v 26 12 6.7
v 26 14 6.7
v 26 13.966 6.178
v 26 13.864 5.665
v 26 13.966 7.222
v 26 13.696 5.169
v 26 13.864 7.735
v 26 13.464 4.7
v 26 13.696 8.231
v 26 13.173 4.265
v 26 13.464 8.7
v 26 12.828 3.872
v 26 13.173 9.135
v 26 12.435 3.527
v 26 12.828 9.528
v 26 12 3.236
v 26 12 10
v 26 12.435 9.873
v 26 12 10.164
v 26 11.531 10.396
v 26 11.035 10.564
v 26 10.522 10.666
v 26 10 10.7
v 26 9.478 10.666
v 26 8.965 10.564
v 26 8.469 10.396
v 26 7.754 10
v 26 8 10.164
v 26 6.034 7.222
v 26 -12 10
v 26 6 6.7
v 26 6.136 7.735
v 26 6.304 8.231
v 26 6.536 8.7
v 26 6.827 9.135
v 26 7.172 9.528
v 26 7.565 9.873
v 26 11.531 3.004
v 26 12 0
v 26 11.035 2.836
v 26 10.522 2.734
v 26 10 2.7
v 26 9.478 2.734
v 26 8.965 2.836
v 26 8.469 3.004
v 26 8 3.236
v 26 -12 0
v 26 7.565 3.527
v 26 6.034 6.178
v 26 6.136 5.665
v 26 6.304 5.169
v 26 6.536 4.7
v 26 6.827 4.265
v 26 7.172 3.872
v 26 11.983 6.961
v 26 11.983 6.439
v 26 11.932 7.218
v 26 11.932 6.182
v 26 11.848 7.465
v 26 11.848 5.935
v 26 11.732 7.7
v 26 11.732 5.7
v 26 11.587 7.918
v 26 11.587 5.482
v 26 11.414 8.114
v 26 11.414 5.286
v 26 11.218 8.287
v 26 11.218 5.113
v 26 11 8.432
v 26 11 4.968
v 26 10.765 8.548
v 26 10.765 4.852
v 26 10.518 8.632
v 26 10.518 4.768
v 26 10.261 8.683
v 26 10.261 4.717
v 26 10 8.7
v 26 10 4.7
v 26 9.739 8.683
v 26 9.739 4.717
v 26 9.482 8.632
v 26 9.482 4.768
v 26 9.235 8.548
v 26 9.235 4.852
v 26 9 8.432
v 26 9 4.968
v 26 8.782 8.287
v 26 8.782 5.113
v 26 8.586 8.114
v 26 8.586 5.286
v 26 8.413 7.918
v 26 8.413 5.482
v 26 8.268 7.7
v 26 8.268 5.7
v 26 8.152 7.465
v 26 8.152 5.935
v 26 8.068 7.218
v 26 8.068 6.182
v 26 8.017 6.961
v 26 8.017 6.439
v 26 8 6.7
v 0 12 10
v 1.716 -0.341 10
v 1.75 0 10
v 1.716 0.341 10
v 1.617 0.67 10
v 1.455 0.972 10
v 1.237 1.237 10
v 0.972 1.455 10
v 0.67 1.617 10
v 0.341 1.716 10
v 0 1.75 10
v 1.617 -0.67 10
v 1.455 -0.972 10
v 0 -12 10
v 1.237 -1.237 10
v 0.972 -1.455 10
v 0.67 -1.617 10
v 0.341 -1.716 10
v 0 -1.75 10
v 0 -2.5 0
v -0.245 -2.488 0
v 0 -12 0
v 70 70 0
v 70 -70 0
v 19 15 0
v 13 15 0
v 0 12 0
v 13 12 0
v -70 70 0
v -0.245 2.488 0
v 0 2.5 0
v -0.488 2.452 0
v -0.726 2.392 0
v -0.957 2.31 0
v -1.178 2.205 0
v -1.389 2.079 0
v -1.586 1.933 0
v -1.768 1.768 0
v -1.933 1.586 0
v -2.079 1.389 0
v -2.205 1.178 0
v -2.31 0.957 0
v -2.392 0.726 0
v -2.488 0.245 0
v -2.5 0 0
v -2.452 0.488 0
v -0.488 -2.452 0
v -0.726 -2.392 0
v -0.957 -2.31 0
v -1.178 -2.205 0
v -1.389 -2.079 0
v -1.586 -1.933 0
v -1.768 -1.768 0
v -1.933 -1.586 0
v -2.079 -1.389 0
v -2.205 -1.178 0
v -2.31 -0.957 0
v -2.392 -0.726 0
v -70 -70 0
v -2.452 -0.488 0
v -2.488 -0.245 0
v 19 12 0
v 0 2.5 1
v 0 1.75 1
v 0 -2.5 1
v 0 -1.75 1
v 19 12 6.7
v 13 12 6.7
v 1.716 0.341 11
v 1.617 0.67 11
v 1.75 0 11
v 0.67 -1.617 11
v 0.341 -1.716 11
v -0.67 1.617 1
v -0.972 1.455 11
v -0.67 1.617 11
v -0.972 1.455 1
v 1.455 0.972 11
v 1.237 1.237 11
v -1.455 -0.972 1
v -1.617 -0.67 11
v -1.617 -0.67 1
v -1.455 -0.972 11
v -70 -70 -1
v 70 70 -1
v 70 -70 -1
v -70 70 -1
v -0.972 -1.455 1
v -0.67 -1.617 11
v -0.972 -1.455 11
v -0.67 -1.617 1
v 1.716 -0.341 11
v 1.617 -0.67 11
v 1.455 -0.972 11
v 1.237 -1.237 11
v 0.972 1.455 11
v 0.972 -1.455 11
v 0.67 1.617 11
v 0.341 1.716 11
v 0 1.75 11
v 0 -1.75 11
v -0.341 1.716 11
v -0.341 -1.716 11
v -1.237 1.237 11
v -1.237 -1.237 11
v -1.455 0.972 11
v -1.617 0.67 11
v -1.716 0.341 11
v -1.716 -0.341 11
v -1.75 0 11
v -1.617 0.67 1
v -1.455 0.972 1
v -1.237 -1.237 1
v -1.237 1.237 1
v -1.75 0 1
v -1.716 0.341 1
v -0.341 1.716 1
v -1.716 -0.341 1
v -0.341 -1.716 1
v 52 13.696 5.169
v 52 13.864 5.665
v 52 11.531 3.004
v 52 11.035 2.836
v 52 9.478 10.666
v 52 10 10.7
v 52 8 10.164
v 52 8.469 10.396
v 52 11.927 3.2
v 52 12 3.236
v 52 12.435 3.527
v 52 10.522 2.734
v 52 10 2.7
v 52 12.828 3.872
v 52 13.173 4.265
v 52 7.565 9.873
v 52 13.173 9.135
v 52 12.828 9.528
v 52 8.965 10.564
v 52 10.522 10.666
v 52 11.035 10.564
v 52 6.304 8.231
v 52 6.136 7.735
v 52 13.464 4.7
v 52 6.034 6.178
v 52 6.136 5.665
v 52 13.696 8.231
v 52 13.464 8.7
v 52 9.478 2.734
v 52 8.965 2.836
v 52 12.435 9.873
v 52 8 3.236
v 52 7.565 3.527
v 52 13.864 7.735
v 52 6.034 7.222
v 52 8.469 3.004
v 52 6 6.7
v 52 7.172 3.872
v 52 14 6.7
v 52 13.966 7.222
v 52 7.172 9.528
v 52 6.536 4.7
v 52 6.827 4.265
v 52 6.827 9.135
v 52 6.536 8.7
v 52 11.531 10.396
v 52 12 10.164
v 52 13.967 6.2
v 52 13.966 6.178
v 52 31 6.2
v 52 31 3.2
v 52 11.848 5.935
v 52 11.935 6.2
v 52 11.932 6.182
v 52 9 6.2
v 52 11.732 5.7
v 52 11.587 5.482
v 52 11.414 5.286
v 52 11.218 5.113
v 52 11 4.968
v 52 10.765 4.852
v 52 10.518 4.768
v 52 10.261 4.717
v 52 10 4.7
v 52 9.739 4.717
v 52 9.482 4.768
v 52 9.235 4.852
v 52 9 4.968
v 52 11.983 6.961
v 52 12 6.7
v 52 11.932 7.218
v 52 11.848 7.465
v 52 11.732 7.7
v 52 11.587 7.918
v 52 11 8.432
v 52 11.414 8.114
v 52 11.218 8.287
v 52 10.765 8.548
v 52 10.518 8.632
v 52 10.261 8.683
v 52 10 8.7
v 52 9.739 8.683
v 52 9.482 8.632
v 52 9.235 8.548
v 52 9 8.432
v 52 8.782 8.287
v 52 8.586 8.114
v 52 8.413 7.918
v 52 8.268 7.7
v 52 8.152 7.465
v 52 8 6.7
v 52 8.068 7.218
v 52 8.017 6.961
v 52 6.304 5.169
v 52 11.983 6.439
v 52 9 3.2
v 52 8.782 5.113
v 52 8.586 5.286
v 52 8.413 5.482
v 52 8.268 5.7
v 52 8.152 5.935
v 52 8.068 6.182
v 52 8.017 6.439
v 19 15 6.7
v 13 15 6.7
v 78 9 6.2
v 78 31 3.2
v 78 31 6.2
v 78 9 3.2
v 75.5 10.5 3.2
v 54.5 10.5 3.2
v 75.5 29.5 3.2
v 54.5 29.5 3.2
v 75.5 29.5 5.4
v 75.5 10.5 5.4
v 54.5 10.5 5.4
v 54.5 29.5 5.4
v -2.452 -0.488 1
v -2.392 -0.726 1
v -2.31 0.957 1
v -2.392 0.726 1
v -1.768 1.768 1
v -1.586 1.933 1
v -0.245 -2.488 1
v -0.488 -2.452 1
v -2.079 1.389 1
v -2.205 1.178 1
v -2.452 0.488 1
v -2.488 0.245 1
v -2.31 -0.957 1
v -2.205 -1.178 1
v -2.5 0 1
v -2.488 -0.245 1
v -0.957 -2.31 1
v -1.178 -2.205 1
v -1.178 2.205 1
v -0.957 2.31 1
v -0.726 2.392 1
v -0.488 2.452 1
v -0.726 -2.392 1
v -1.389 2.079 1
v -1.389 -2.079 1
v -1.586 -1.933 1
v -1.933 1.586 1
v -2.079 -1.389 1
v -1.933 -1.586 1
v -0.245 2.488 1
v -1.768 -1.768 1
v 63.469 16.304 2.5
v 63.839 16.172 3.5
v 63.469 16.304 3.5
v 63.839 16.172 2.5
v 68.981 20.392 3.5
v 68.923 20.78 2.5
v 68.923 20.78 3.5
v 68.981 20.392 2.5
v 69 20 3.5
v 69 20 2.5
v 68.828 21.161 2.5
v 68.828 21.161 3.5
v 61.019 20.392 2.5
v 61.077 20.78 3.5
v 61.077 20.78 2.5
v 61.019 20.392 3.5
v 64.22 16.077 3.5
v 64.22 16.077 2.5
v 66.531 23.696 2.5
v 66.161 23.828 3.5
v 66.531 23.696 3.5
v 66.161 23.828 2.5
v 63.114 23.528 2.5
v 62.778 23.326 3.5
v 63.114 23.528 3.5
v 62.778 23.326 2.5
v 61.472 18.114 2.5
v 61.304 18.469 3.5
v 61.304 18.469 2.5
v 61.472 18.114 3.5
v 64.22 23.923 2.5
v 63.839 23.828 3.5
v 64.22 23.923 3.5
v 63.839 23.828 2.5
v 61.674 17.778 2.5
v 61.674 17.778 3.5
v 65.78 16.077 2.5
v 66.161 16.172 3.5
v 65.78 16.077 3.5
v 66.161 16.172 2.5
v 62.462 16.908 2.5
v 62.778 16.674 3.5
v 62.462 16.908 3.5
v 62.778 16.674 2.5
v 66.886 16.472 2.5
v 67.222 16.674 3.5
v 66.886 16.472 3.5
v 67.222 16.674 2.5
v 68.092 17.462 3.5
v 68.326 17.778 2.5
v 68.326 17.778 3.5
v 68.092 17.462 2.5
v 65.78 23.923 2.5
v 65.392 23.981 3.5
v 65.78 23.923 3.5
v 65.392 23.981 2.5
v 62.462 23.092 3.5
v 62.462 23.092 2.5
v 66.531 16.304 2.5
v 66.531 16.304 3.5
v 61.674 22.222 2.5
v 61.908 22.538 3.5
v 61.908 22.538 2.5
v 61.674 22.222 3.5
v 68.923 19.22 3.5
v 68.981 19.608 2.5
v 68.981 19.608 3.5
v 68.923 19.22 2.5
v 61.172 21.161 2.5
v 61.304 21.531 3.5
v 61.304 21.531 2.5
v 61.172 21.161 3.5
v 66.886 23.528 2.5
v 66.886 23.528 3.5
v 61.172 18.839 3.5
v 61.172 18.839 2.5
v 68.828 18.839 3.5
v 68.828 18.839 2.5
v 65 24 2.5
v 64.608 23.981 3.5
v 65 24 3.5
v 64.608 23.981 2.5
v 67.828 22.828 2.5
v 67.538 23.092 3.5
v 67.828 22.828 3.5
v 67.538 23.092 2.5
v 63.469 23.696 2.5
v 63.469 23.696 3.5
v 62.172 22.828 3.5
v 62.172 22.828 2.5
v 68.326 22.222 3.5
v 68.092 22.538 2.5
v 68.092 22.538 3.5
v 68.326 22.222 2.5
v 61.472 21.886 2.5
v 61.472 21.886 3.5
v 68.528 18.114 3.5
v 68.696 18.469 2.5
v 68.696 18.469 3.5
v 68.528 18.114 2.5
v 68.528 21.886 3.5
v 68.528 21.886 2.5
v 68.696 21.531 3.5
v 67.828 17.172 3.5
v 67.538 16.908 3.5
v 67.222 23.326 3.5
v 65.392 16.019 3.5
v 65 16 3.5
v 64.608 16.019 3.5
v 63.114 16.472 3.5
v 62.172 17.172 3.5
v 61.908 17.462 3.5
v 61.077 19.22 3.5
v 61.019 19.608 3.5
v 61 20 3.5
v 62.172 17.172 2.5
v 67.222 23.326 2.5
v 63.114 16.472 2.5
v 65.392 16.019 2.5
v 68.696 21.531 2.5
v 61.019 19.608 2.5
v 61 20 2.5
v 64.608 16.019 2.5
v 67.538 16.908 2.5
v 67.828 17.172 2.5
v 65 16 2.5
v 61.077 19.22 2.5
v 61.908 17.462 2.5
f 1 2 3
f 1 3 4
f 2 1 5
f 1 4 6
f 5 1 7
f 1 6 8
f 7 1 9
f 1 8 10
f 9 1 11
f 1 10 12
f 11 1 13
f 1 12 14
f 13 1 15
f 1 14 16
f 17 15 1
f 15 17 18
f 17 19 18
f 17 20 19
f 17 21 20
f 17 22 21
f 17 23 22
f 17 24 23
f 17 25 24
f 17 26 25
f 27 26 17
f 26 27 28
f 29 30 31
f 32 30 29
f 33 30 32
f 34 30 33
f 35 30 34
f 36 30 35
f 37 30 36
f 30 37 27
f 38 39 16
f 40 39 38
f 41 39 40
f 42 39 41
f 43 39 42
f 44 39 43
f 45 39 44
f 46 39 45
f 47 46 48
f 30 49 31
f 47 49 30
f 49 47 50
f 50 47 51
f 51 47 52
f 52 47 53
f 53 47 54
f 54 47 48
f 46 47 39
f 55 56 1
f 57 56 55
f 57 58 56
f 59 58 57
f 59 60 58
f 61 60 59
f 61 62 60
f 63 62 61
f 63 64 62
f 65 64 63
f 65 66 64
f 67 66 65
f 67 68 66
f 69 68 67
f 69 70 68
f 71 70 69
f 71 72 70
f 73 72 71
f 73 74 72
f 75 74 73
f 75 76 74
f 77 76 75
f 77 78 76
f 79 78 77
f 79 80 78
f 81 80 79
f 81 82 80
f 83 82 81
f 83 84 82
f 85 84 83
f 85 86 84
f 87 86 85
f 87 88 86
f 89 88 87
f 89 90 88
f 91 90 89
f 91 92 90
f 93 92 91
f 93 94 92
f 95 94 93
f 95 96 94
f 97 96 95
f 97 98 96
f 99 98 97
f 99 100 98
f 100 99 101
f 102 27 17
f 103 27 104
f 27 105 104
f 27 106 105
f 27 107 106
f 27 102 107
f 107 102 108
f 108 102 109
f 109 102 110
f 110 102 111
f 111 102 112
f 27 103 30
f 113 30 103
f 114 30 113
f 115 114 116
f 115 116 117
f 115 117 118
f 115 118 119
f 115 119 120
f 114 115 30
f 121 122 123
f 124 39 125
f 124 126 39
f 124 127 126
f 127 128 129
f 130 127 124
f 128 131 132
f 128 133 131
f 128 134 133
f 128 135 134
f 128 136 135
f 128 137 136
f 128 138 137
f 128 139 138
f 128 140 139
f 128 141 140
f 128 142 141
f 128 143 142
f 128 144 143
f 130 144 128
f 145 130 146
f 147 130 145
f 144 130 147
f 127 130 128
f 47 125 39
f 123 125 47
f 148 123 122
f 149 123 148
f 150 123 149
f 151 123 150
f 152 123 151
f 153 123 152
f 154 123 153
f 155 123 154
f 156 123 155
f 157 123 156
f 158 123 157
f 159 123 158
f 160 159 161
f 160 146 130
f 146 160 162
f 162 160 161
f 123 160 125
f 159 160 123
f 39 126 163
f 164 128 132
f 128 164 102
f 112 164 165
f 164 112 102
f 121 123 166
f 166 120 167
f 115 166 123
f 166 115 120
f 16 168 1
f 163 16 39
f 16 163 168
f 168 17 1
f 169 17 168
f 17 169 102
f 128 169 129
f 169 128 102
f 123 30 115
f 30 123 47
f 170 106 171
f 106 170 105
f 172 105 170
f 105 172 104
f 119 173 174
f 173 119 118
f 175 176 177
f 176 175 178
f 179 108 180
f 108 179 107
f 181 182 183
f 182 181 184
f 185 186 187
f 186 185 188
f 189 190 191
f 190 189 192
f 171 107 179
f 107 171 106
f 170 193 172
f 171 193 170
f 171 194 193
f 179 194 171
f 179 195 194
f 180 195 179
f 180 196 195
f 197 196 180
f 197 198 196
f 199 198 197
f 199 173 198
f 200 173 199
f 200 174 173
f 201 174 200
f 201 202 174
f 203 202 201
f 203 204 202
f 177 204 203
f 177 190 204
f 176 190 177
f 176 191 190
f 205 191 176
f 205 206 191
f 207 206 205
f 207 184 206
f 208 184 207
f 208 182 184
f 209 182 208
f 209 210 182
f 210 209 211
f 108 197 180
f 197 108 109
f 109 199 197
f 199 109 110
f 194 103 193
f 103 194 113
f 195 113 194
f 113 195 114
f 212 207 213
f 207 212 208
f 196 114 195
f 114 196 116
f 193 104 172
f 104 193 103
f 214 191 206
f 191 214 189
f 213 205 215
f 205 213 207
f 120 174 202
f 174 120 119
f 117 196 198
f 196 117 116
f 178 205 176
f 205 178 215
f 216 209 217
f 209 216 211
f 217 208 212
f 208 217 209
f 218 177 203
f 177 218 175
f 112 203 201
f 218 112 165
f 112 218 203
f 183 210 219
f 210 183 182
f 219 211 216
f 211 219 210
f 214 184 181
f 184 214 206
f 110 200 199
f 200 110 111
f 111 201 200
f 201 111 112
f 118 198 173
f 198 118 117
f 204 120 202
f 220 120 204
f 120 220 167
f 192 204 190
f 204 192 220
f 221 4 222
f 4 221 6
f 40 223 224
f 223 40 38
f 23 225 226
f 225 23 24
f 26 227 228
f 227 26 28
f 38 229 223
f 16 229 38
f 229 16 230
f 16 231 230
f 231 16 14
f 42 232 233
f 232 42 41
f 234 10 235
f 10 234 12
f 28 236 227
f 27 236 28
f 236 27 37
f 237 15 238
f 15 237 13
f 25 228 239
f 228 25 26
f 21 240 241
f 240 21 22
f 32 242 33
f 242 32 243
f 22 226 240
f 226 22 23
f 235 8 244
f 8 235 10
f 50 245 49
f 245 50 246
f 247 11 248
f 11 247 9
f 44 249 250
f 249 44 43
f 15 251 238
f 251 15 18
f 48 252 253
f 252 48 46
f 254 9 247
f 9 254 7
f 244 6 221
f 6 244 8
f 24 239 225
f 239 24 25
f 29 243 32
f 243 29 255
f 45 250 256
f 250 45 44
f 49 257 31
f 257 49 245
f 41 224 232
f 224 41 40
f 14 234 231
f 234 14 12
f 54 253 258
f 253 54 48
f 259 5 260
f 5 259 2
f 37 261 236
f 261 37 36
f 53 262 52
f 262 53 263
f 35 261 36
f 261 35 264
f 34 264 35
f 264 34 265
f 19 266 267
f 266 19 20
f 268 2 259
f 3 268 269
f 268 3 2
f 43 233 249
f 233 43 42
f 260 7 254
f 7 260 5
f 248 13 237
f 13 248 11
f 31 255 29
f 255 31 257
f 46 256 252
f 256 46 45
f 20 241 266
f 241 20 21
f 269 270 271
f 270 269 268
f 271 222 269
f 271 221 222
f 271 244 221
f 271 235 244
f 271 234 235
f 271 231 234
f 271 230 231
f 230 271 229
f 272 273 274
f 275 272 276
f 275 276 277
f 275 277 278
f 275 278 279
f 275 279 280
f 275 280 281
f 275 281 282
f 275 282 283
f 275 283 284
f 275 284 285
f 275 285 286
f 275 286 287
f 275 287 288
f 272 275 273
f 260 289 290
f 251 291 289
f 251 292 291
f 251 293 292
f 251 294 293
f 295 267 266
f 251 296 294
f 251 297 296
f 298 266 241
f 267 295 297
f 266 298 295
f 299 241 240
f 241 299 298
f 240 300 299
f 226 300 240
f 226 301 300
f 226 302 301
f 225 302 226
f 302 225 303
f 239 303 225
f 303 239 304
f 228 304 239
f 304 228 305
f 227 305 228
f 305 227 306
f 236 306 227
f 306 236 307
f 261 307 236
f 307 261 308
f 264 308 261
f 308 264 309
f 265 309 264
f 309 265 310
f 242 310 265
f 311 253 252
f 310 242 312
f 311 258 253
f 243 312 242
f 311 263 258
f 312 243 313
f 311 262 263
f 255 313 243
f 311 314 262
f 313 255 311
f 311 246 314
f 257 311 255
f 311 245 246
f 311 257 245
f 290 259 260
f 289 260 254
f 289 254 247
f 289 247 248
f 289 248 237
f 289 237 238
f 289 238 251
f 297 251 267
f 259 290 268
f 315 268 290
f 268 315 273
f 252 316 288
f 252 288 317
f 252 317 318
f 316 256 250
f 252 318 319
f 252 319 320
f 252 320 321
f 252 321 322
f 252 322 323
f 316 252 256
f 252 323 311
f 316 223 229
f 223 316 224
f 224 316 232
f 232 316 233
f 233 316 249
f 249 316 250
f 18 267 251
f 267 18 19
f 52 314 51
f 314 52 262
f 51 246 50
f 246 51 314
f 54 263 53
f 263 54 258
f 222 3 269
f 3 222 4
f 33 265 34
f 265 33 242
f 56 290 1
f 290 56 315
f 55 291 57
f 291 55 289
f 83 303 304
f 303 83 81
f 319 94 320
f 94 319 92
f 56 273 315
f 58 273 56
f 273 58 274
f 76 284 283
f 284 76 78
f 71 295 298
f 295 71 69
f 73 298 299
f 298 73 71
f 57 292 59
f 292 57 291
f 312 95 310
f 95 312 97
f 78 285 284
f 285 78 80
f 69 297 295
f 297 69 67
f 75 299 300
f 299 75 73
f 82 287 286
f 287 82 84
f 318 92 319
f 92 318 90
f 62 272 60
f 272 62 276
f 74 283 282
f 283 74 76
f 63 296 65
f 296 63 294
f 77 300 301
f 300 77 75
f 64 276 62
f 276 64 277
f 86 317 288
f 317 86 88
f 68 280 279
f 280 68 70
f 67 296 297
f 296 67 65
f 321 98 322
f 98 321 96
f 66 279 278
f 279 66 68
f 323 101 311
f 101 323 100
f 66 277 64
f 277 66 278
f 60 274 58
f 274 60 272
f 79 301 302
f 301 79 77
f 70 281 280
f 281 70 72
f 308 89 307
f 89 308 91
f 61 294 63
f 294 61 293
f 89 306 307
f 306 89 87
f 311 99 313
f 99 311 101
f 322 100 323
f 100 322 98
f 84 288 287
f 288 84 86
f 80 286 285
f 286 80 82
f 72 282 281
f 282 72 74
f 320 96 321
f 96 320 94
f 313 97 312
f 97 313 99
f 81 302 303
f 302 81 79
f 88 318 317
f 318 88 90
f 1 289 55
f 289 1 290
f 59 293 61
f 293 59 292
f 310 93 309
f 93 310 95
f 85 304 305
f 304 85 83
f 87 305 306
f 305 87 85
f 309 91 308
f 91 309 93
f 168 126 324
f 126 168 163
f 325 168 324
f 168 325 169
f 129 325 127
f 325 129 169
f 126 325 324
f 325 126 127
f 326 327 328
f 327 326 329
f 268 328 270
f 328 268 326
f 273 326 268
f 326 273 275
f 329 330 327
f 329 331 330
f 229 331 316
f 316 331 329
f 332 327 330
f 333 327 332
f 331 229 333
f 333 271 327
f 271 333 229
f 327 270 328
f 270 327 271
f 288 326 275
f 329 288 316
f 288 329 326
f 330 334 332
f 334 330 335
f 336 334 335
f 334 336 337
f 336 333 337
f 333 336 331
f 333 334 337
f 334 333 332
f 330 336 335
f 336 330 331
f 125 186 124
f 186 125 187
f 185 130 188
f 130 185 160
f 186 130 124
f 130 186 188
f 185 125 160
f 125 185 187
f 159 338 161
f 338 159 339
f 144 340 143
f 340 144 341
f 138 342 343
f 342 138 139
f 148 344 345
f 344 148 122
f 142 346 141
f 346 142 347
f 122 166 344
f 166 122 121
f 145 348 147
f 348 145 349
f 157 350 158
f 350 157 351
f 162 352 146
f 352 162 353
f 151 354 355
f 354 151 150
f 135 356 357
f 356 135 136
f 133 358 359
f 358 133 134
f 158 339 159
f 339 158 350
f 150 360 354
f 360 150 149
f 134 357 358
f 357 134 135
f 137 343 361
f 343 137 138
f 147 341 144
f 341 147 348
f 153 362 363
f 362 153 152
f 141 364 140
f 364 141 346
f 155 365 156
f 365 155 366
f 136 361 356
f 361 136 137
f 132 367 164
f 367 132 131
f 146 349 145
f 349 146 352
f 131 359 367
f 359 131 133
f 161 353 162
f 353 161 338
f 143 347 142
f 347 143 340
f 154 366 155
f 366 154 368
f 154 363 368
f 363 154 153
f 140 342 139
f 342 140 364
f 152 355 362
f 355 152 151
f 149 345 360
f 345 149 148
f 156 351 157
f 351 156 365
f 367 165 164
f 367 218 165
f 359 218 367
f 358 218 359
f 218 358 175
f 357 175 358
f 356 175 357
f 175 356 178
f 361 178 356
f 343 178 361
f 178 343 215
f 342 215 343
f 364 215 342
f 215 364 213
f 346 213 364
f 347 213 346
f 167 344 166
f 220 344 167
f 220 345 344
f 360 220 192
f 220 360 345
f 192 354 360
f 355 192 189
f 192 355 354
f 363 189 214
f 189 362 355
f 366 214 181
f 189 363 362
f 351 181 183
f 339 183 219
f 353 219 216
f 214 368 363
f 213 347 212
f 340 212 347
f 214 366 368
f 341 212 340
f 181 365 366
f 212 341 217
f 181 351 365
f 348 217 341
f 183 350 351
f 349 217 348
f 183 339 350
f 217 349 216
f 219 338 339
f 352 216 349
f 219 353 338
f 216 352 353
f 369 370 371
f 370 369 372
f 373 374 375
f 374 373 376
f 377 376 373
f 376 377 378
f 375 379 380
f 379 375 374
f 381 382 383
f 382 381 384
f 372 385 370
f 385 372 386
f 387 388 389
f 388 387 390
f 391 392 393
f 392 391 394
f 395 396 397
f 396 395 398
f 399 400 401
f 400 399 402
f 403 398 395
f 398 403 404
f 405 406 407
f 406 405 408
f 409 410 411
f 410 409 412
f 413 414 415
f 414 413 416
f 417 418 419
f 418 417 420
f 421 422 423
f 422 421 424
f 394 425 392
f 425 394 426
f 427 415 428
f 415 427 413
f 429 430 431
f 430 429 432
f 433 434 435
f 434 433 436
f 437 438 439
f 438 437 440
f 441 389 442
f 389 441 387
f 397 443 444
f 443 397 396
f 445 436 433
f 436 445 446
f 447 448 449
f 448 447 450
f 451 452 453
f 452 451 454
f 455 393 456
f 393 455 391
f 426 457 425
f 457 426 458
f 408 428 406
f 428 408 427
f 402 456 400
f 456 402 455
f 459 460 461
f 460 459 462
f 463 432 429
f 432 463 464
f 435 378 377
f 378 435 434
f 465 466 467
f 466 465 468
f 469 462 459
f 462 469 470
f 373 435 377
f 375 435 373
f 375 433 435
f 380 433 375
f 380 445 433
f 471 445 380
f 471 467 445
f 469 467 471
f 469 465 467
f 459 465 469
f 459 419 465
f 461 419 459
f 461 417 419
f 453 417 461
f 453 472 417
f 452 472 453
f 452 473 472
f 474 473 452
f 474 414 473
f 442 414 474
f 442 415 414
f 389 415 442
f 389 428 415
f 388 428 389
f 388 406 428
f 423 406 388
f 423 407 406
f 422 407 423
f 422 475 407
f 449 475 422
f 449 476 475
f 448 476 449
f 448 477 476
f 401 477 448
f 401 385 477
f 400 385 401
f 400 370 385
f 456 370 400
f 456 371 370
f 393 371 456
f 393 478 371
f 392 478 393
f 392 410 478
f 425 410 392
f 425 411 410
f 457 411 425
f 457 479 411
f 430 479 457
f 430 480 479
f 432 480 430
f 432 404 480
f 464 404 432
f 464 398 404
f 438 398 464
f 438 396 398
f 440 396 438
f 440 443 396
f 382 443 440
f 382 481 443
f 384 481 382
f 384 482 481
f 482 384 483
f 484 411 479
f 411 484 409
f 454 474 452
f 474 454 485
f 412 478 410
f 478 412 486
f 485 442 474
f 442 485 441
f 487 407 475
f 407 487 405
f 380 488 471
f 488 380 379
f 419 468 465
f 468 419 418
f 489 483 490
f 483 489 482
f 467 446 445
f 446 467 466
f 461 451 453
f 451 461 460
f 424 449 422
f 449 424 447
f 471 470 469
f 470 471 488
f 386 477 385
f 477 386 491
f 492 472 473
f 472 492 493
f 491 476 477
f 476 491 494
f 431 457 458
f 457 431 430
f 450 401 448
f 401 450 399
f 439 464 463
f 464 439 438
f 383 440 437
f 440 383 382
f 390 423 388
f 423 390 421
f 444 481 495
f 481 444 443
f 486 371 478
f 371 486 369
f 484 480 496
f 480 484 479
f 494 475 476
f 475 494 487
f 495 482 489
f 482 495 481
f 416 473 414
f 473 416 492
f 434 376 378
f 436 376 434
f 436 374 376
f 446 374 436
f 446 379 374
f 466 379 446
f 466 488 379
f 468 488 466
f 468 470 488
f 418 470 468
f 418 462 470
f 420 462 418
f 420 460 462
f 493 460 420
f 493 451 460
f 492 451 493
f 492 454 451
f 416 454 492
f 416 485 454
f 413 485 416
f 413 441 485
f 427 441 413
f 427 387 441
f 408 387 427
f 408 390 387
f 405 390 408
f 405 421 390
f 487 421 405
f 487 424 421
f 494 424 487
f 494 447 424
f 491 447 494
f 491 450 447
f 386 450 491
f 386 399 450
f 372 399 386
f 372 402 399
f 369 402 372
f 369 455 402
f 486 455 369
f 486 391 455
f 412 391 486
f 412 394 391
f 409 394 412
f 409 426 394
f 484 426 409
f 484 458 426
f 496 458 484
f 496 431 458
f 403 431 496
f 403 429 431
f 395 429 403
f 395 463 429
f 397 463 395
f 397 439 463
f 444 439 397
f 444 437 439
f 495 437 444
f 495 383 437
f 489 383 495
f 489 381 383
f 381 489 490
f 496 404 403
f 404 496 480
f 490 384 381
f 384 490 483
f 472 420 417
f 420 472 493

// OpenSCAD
//
// HDD jog wheel "tone arm" for Adafruit AS5600 (Adafruit 6357)
// Arm mounts at the left screw hole, treated as (0, 0)
// Spindle centre is at (spindle_dx, spindle_dy)
//
// All units in millimetres
//

// --------------------------
// Geometry inputs
// --------------------------

// Height from HDD lid to magnet top
magnet_above_lid = 3;          // 3 mm magnet on the hub

// Sensor gap you want between chip and magnet
sensor_gap = 2;                // 1 to 3 mm is ideal

// Board dimensions for Adafruit 6357 (approx, tweak if needed)
board_x = 20;   // along arm
board_y = 18;   // across arm
pcb_thickness = 1.6;
chip_above_pcb = 1.0;          // distance chip body top above PCB

// Tone arm geometry
arm_outer_diameter  = 8;
arm_inner_diameter  = 4;
headshell_length    = 26;      // region under sensor
headshell_width     = 22;
headshell_thickness = 3;

// Mount block geometry
base_block_length   = 26;
base_block_width    = 24;
base_block_height   = 10;
mount_hole_diameter = 3.5;     // M3 screw

// --------------------------
// Position of spindle relative to screw hole
// X to the right, Y up when looking at the lid
// Your measurements:
//   X = 65 mm
//   Y = 20 mm
// --------------------------

spindle_dx = 65;
spindle_dy = 20;

// --------------------------
// Derived heights
// --------------------------

// Magnet top relative to lid plane
magnet_top_z = magnet_above_lid;

// Chip height
chip_z       = magnet_top_z + sensor_gap;

// PCB bottom height so chip lands at chip_z
pcb_bottom_z = chip_z - chip_above_pcb - pcb_thickness / 2;

// Place underside of headshell just above PCB
headshell_z  = pcb_bottom_z + headshell_thickness / 2;

// Arm tube centre height
arm_centre_z = headshell_z + 2;   // small offset above headshell

// --------------------------
// Helper modules
// --------------------------

module arm_tube(length, od, id) {
    difference() {
        rotate([0,90,0])
            cylinder(h = length, r = od/2, center = true, $fn = 48);
        rotate([0,90,0])
            cylinder(h = length + 0.5, r = id/2, center = true, $fn = 48);
    }
}

module base_block() {
    // Block extends out in +X from the screw hole at (0,0)
    translate([base_block_length/2, 0, base_block_height/2])
        cube([base_block_length, base_block_width, base_block_height], center = true);

    // Mount hole at origin down through the block
    translate([0, 0, base_block_height/2])
        cylinder(h = base_block_height + 2,
                 d = mount_hole_diameter,
                 center = true, $fn = 32);
}

module headshell() {
    translate([spindle_dx, spindle_dy, headshell_z])
        cube([headshell_length, headshell_width, headshell_thickness],
             center = true);
}

module as5600_pocket() {
    // Slightly oversized pocket for the PCB inside the headshell
    pocket_x = board_x + 1;
    pocket_y = board_y + 1;
    pocket_z = headshell_thickness - 0.8;   // thin roof

    translate([spindle_dx, spindle_dy,
               pcb_bottom_z + pocket_z/2])
        cube([pocket_x, pocket_y, pocket_z], center = true);
}

// --------------------------
// Main arm
// --------------------------

module tone_arm() {
    difference() {
        union() {
            // Base mount at screw hole
            base_block();

            // Arm tube from block to headshell
            arm_start_x = base_block_length;             // from just ahead of screw
            arm_end_x   = spindle_dx - headshell_length/2;
            arm_len     = arm_end_x - arm_start_x;

            translate([(arm_start_x + arm_end_x) / 2,
                       spindle_dy / 2,
                       arm_centre_z])
                arm_tube(arm_len, arm_outer_diameter, arm_inner_diameter);

            // Small support between block and arm
            translate([base_block_length / 2 + 3,
                       spindle_dy / 2,
                       arm_centre_z / 2])
                cube([6, 10, arm_centre_z], center = true);

            // Headshell
            headshell();
        }

        // Cut PCB pocket
        as5600_pocket();
    }
}

// --------------------------
// Preview helpers
// --------------------------

$fn = 64;

// Show HDD lid as a plane at z = 0
color([0.8,0.8,0.8,0.3])
translate([0,0,-0.5])
cube([140, 140, 1], center = true);

// Screw hole marker at origin
color("blue")
translate([0,0,0])
cylinder(h = 2, d = 5, center = true);

// Spindle centre marker and magnet top
color("red")
translate([spindle_dx, spindle_dy, magnet_top_z])
cylinder(h = 1, d = 8, center = true);

// Tone arm
color("silver")
tone_arm();
